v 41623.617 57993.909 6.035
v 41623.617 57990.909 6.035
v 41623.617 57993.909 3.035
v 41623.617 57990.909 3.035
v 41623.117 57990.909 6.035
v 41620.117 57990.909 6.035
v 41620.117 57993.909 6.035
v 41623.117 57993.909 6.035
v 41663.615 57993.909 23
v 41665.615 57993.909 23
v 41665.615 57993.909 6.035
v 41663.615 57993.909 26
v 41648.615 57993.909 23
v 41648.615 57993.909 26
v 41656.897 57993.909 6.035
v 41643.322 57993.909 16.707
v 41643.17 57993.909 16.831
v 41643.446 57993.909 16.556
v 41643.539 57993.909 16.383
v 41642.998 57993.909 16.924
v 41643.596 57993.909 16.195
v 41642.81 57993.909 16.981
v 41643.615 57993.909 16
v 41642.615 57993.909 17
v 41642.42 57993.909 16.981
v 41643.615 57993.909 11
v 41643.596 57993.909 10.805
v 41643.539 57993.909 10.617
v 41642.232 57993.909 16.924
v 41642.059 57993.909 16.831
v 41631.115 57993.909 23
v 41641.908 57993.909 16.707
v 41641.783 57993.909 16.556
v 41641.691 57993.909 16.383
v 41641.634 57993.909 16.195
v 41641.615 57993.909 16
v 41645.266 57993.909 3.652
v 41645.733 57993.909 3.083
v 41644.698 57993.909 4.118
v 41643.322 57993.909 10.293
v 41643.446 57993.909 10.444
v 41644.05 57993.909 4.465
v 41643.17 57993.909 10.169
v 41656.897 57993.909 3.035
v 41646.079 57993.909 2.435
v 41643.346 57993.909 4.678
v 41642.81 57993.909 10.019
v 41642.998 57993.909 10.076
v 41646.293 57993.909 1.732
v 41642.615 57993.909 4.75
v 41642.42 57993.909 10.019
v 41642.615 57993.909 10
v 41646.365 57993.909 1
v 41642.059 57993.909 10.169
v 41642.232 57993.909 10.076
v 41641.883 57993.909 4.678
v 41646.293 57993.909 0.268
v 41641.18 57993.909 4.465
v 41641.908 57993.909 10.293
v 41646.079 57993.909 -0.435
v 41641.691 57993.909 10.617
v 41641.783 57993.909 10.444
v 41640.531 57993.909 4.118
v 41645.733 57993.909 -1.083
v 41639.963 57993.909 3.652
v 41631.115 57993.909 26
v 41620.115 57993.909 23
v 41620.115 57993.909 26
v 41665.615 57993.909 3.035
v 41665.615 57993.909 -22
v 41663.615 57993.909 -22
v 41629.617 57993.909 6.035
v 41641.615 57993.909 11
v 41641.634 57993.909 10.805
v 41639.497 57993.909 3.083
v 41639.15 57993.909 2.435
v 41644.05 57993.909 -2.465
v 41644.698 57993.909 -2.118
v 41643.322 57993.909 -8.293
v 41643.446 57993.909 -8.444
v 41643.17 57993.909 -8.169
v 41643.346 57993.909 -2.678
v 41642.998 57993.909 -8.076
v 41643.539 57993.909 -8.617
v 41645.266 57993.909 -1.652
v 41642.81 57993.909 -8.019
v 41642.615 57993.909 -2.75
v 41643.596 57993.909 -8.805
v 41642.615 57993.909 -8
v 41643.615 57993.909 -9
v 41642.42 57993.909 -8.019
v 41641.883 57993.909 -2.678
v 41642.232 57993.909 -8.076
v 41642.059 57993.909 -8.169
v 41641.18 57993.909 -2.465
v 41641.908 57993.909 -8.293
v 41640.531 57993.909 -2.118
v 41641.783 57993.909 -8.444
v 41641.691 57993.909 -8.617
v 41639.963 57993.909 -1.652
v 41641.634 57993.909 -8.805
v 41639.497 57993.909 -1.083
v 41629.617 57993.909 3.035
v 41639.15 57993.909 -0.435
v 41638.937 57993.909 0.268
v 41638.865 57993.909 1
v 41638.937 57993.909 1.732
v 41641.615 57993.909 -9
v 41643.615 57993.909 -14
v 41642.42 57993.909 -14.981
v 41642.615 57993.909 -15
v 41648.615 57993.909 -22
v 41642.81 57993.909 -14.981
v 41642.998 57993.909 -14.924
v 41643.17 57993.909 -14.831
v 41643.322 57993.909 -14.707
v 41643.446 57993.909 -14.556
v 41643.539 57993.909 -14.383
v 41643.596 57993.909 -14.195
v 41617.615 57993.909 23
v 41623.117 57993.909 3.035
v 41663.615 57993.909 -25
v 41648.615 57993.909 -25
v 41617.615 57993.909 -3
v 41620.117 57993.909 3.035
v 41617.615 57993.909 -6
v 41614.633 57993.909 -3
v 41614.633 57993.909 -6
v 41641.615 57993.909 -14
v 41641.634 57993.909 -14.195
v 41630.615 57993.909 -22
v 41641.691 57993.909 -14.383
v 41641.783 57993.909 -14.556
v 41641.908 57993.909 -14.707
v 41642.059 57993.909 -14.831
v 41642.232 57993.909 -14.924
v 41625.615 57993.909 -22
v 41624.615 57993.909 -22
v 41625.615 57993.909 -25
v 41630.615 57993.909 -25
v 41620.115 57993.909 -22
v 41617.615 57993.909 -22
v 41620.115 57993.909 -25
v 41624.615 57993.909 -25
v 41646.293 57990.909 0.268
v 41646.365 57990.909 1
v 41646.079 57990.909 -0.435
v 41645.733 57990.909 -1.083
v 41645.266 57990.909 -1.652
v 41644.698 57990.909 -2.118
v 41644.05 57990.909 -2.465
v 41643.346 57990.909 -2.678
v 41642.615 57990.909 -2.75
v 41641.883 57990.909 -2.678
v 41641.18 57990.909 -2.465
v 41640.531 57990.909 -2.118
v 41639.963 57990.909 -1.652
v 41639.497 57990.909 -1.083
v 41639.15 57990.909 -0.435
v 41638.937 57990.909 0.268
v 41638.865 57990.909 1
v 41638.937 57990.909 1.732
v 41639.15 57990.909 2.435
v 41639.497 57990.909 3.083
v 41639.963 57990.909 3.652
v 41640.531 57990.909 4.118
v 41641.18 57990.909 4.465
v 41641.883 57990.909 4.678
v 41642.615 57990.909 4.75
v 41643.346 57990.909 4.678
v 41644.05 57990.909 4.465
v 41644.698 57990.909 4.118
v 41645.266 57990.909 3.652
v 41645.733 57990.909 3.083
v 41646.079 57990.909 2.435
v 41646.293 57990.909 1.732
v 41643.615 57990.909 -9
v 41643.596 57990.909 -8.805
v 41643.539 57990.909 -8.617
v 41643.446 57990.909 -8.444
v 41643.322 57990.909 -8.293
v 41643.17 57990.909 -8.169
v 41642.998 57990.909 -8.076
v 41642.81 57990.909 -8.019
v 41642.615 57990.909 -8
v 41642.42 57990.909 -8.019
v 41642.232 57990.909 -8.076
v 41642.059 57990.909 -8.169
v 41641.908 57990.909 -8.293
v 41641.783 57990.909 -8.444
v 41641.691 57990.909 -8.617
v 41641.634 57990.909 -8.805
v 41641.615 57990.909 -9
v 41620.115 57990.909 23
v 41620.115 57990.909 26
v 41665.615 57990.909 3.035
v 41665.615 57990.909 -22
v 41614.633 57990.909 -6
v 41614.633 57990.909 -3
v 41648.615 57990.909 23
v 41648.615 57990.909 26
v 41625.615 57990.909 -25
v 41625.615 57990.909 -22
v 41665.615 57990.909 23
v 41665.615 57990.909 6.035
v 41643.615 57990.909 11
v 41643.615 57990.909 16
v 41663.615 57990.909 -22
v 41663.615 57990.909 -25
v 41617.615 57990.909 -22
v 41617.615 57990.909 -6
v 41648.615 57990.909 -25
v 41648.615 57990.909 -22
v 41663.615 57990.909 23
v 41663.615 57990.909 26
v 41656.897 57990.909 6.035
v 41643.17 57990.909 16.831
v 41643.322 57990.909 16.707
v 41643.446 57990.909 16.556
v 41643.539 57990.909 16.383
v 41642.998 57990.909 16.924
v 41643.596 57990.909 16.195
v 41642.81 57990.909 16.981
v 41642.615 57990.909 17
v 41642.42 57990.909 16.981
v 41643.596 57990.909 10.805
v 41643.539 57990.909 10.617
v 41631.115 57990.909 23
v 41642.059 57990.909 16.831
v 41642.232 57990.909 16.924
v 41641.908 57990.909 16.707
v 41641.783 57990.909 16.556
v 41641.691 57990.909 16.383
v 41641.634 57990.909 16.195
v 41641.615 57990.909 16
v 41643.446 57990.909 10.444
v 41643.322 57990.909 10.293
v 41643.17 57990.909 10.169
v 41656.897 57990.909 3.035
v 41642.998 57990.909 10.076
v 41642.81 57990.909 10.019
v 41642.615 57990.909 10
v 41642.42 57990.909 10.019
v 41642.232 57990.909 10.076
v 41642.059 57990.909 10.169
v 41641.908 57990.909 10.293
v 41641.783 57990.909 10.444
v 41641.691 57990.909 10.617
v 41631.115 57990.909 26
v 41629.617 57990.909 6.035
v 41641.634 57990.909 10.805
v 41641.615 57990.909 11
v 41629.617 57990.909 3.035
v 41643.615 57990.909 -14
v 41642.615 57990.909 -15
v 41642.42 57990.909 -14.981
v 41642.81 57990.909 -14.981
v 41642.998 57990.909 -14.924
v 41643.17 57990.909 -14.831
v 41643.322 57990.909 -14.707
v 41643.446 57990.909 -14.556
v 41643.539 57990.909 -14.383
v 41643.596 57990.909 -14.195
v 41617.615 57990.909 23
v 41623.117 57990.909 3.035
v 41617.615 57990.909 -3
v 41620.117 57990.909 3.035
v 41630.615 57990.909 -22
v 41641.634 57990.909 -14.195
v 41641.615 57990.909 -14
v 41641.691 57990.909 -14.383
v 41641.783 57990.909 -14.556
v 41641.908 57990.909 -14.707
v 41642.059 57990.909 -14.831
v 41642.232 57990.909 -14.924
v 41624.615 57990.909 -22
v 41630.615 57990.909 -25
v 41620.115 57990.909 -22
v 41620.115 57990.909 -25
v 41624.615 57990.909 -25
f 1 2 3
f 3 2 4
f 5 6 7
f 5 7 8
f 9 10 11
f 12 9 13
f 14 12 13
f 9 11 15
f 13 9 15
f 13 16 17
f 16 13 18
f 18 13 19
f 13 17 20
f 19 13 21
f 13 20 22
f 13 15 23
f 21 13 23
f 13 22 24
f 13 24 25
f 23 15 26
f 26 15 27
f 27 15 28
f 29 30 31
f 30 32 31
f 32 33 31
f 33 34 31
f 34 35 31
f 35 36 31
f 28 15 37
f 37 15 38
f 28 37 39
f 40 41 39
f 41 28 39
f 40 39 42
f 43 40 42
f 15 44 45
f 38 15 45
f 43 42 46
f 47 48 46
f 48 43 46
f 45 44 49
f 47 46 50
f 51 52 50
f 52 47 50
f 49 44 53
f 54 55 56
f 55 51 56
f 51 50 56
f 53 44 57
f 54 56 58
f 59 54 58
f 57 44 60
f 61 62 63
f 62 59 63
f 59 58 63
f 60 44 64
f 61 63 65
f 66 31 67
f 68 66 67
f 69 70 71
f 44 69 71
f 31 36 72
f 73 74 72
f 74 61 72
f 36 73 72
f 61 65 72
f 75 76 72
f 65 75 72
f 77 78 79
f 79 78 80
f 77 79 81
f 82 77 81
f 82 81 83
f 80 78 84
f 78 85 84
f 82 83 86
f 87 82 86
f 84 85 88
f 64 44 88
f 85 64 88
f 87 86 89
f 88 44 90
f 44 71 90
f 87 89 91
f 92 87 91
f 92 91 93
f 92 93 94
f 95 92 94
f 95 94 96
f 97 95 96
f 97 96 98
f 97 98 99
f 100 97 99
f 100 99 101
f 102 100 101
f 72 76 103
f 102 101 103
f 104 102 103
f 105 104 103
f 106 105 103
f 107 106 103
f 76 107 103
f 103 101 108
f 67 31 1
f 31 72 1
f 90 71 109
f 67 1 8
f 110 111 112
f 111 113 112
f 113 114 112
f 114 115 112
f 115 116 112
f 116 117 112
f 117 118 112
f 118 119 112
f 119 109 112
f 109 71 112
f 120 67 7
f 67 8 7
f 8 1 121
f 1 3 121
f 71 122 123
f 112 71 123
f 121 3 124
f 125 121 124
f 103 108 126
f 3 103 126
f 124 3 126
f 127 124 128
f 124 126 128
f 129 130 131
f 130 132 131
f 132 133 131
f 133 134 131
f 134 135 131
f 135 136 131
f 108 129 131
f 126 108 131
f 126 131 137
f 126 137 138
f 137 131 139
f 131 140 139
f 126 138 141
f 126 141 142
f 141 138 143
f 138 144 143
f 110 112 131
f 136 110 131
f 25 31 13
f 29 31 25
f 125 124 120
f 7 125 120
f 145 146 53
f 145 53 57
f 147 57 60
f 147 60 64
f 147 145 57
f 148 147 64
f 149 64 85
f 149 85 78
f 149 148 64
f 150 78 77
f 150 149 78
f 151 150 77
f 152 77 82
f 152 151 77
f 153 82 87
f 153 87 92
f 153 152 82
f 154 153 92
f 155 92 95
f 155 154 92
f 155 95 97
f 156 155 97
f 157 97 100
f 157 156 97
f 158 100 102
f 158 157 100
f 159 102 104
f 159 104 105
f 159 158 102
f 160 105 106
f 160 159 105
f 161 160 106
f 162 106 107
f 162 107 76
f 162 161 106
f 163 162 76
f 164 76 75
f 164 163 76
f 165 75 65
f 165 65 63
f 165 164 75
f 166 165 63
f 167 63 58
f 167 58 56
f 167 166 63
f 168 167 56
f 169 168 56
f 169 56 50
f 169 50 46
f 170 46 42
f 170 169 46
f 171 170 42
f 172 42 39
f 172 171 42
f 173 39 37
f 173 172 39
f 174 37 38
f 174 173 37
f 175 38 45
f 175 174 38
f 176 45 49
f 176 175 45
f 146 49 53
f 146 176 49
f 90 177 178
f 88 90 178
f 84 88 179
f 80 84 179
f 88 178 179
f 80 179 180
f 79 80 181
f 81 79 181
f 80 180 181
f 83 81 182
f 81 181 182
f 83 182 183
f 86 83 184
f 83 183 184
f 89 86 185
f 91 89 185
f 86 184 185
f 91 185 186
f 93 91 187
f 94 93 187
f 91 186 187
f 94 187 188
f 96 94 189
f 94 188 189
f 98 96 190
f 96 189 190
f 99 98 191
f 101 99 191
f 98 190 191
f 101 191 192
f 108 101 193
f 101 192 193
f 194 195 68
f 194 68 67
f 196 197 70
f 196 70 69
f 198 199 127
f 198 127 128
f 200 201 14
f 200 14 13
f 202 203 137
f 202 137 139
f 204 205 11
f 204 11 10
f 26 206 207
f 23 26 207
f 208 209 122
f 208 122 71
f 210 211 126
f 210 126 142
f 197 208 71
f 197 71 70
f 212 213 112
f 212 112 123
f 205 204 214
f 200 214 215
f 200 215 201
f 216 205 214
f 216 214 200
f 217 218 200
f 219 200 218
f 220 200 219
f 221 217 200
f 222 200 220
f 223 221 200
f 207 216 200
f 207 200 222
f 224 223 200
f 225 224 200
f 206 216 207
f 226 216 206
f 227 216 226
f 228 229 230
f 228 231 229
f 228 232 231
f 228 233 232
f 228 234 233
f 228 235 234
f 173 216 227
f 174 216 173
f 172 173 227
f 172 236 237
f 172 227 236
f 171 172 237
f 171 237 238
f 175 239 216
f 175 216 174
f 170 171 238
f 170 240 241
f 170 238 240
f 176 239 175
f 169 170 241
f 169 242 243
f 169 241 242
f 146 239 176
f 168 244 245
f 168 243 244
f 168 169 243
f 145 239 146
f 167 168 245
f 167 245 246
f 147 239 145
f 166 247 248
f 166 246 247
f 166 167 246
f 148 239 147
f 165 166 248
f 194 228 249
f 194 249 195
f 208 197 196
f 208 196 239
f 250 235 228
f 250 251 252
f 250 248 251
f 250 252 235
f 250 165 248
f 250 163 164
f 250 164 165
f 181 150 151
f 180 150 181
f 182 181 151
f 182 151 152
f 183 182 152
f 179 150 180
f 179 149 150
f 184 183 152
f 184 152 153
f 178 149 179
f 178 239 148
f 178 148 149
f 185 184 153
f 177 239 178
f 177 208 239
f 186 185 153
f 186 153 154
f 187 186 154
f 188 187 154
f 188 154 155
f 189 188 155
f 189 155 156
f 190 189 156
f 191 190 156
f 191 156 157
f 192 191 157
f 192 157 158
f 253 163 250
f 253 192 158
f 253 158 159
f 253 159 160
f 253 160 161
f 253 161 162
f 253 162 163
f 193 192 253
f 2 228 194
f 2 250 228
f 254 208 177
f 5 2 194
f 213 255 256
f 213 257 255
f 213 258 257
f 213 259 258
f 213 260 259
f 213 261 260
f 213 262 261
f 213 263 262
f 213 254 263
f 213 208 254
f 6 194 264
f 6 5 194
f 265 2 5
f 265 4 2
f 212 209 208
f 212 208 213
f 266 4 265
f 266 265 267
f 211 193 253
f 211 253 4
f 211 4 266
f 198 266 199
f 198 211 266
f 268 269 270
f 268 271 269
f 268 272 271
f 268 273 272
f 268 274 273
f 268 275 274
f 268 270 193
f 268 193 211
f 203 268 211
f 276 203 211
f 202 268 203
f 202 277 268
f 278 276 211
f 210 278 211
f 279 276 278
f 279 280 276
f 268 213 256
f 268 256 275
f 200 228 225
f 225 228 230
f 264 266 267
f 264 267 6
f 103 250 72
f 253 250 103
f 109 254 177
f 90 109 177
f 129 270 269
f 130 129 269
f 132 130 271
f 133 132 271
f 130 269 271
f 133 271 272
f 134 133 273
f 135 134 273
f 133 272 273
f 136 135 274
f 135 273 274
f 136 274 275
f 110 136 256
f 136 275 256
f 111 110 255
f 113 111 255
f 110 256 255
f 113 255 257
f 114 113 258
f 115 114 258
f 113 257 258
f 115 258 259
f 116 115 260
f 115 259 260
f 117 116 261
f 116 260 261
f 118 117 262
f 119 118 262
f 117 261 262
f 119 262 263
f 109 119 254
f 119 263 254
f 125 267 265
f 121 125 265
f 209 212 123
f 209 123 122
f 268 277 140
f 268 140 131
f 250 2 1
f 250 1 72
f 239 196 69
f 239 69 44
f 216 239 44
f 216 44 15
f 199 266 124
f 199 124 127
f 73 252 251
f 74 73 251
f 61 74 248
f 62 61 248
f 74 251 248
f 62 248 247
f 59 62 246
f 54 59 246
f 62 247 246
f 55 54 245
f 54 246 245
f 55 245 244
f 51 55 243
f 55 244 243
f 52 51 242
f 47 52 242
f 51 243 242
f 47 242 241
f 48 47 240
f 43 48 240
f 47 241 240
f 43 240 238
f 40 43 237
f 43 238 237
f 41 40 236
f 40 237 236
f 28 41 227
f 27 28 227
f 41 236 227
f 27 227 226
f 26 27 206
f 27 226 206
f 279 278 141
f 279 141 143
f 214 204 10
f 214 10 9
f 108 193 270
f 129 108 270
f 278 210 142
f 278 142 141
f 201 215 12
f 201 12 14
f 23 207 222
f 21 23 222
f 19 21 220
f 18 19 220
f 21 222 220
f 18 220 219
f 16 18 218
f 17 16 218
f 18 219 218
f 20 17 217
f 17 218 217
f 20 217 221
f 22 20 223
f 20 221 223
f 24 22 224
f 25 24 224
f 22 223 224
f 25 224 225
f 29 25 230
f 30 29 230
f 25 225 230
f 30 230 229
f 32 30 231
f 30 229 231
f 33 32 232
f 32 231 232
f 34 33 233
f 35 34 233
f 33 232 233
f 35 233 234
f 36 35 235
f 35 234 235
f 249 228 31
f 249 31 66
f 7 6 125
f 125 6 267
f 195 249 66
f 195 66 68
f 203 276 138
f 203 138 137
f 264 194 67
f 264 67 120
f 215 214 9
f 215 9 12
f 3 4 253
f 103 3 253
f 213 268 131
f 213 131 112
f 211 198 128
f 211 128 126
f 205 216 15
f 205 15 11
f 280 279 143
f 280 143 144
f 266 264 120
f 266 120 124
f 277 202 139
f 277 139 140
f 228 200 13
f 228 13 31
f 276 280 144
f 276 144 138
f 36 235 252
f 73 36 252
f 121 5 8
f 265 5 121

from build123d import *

# Parameters (mm, degrees)
CROQUIS1_R                 = 3.75
CROQUIS1_W                 = 6
CROQUIS1_H                 = 3.000001037
CROQUIS1_W_2               = 3
SALIENTE_EXTRUIR1_DEPTH    = 3
S_LIDO_MOVER_COPIAR1_ANGLE = 90


with BuildPart() as part:
    # Croquis1 → Saliente-Extruir1 (new body)
    with BuildSketch(Plane.XY):
        Polygon((41630.614837019, 58015.908765172), (41648.614837019, 58015.908765172), (41648.614837019, 58018.908765172), (41663.614837019, 58018.908765172), (41663.614837019, 58015.908765172), (41665.614813532, 58015.908765172), (41665.614813532, 57990.873439675), (41656.89673353, 57990.873439675), (41656.89673353, 57987.873438638), (41665.614813532, 57987.873438638), (41665.614813532, 57970.908765172), (41663.615195237, 57970.908765172), (41663.615195237, 57967.908765172), (41648.615195237, 57967.908765172), (41648.615195237, 57970.908765172), (41631.115195237, 57970.908765172), (41631.115195237, 57967.908765172), (41620.114837019, 57967.908765172), (41620.114837019, 57970.908765172), (41617.614837019, 57970.908765172), (41617.614837019, 57996.908765172), (41614.63346575, 57996.908765172), (41614.63346575, 57999.908765172), (41617.614837019, 57999.908765172), (41617.614837019, 58015.908765172), (41620.114837019, 58015.908765172), (41620.114837019, 58018.908765172), (41624.614837019, 58018.908765172), (41624.614837019, 58015.908765172), (41625.614837019, 58015.908765172), (41625.614837019, 58018.908765172), (41630.614837019, 58018.908765172), align=None)
        with Locations((41642.614837019, 57992.908765172)):
            Circle(CROQUIS1_R, mode=Mode.SUBTRACT)
        with BuildLine():
            Line((41643.614837019, 57982.908765172), (41643.614837019, 57977.908765172))
            ThreePointArc((41643.614837019, 57977.908765172), (41642.614837019, 57976.908765172), (41641.614837019, 57977.908765172))
            Line((41641.614837019, 57977.908765172), (41641.614837019, 57982.908765172))
            ThreePointArc((41641.614837019, 57982.908765172), (41642.614837019, 57983.908765172), (41643.614837019, 57982.908765172))
        make_face(mode=Mode.SUBTRACT)
        with BuildLine():
            Line((41643.614837019, 58007.908765172), (41643.614837019, 58002.908765172))
            ThreePointArc((41643.614837019, 58002.908765172), (41642.614837019, 58001.908765172), (41641.614837019, 58002.908765172))
            Line((41641.614837019, 58002.908765172), (41641.614837019, 58007.908765172))
            ThreePointArc((41641.614837019, 58007.908765172), (41642.614837019, 58008.908765172), (41643.614837019, 58007.908765172))
        make_face(mode=Mode.SUBTRACT)
        with Locations((41626.616584693, 57989.373439157)):
            Rectangle(CROQUIS1_W, CROQUIS1_H, mode=Mode.SUBTRACT)
        with Locations((41621.616584693, 57989.373439157)):
            Rectangle(CROQUIS1_W_2, CROQUIS1_H, mode=Mode.SUBTRACT)
    extrude(amount=SALIENTE_EXTRUIR1_DEPTH)


with BuildPart() as part_1:
    # Sólido-Mover/Copiar1: moved
    add(part.part.rotate(Axis((0, 57992.408765172, 1.5), (-1, 0, 0)), S_LIDO_MOVER_COPIAR1_ANGLE))


solid = part_1.part
